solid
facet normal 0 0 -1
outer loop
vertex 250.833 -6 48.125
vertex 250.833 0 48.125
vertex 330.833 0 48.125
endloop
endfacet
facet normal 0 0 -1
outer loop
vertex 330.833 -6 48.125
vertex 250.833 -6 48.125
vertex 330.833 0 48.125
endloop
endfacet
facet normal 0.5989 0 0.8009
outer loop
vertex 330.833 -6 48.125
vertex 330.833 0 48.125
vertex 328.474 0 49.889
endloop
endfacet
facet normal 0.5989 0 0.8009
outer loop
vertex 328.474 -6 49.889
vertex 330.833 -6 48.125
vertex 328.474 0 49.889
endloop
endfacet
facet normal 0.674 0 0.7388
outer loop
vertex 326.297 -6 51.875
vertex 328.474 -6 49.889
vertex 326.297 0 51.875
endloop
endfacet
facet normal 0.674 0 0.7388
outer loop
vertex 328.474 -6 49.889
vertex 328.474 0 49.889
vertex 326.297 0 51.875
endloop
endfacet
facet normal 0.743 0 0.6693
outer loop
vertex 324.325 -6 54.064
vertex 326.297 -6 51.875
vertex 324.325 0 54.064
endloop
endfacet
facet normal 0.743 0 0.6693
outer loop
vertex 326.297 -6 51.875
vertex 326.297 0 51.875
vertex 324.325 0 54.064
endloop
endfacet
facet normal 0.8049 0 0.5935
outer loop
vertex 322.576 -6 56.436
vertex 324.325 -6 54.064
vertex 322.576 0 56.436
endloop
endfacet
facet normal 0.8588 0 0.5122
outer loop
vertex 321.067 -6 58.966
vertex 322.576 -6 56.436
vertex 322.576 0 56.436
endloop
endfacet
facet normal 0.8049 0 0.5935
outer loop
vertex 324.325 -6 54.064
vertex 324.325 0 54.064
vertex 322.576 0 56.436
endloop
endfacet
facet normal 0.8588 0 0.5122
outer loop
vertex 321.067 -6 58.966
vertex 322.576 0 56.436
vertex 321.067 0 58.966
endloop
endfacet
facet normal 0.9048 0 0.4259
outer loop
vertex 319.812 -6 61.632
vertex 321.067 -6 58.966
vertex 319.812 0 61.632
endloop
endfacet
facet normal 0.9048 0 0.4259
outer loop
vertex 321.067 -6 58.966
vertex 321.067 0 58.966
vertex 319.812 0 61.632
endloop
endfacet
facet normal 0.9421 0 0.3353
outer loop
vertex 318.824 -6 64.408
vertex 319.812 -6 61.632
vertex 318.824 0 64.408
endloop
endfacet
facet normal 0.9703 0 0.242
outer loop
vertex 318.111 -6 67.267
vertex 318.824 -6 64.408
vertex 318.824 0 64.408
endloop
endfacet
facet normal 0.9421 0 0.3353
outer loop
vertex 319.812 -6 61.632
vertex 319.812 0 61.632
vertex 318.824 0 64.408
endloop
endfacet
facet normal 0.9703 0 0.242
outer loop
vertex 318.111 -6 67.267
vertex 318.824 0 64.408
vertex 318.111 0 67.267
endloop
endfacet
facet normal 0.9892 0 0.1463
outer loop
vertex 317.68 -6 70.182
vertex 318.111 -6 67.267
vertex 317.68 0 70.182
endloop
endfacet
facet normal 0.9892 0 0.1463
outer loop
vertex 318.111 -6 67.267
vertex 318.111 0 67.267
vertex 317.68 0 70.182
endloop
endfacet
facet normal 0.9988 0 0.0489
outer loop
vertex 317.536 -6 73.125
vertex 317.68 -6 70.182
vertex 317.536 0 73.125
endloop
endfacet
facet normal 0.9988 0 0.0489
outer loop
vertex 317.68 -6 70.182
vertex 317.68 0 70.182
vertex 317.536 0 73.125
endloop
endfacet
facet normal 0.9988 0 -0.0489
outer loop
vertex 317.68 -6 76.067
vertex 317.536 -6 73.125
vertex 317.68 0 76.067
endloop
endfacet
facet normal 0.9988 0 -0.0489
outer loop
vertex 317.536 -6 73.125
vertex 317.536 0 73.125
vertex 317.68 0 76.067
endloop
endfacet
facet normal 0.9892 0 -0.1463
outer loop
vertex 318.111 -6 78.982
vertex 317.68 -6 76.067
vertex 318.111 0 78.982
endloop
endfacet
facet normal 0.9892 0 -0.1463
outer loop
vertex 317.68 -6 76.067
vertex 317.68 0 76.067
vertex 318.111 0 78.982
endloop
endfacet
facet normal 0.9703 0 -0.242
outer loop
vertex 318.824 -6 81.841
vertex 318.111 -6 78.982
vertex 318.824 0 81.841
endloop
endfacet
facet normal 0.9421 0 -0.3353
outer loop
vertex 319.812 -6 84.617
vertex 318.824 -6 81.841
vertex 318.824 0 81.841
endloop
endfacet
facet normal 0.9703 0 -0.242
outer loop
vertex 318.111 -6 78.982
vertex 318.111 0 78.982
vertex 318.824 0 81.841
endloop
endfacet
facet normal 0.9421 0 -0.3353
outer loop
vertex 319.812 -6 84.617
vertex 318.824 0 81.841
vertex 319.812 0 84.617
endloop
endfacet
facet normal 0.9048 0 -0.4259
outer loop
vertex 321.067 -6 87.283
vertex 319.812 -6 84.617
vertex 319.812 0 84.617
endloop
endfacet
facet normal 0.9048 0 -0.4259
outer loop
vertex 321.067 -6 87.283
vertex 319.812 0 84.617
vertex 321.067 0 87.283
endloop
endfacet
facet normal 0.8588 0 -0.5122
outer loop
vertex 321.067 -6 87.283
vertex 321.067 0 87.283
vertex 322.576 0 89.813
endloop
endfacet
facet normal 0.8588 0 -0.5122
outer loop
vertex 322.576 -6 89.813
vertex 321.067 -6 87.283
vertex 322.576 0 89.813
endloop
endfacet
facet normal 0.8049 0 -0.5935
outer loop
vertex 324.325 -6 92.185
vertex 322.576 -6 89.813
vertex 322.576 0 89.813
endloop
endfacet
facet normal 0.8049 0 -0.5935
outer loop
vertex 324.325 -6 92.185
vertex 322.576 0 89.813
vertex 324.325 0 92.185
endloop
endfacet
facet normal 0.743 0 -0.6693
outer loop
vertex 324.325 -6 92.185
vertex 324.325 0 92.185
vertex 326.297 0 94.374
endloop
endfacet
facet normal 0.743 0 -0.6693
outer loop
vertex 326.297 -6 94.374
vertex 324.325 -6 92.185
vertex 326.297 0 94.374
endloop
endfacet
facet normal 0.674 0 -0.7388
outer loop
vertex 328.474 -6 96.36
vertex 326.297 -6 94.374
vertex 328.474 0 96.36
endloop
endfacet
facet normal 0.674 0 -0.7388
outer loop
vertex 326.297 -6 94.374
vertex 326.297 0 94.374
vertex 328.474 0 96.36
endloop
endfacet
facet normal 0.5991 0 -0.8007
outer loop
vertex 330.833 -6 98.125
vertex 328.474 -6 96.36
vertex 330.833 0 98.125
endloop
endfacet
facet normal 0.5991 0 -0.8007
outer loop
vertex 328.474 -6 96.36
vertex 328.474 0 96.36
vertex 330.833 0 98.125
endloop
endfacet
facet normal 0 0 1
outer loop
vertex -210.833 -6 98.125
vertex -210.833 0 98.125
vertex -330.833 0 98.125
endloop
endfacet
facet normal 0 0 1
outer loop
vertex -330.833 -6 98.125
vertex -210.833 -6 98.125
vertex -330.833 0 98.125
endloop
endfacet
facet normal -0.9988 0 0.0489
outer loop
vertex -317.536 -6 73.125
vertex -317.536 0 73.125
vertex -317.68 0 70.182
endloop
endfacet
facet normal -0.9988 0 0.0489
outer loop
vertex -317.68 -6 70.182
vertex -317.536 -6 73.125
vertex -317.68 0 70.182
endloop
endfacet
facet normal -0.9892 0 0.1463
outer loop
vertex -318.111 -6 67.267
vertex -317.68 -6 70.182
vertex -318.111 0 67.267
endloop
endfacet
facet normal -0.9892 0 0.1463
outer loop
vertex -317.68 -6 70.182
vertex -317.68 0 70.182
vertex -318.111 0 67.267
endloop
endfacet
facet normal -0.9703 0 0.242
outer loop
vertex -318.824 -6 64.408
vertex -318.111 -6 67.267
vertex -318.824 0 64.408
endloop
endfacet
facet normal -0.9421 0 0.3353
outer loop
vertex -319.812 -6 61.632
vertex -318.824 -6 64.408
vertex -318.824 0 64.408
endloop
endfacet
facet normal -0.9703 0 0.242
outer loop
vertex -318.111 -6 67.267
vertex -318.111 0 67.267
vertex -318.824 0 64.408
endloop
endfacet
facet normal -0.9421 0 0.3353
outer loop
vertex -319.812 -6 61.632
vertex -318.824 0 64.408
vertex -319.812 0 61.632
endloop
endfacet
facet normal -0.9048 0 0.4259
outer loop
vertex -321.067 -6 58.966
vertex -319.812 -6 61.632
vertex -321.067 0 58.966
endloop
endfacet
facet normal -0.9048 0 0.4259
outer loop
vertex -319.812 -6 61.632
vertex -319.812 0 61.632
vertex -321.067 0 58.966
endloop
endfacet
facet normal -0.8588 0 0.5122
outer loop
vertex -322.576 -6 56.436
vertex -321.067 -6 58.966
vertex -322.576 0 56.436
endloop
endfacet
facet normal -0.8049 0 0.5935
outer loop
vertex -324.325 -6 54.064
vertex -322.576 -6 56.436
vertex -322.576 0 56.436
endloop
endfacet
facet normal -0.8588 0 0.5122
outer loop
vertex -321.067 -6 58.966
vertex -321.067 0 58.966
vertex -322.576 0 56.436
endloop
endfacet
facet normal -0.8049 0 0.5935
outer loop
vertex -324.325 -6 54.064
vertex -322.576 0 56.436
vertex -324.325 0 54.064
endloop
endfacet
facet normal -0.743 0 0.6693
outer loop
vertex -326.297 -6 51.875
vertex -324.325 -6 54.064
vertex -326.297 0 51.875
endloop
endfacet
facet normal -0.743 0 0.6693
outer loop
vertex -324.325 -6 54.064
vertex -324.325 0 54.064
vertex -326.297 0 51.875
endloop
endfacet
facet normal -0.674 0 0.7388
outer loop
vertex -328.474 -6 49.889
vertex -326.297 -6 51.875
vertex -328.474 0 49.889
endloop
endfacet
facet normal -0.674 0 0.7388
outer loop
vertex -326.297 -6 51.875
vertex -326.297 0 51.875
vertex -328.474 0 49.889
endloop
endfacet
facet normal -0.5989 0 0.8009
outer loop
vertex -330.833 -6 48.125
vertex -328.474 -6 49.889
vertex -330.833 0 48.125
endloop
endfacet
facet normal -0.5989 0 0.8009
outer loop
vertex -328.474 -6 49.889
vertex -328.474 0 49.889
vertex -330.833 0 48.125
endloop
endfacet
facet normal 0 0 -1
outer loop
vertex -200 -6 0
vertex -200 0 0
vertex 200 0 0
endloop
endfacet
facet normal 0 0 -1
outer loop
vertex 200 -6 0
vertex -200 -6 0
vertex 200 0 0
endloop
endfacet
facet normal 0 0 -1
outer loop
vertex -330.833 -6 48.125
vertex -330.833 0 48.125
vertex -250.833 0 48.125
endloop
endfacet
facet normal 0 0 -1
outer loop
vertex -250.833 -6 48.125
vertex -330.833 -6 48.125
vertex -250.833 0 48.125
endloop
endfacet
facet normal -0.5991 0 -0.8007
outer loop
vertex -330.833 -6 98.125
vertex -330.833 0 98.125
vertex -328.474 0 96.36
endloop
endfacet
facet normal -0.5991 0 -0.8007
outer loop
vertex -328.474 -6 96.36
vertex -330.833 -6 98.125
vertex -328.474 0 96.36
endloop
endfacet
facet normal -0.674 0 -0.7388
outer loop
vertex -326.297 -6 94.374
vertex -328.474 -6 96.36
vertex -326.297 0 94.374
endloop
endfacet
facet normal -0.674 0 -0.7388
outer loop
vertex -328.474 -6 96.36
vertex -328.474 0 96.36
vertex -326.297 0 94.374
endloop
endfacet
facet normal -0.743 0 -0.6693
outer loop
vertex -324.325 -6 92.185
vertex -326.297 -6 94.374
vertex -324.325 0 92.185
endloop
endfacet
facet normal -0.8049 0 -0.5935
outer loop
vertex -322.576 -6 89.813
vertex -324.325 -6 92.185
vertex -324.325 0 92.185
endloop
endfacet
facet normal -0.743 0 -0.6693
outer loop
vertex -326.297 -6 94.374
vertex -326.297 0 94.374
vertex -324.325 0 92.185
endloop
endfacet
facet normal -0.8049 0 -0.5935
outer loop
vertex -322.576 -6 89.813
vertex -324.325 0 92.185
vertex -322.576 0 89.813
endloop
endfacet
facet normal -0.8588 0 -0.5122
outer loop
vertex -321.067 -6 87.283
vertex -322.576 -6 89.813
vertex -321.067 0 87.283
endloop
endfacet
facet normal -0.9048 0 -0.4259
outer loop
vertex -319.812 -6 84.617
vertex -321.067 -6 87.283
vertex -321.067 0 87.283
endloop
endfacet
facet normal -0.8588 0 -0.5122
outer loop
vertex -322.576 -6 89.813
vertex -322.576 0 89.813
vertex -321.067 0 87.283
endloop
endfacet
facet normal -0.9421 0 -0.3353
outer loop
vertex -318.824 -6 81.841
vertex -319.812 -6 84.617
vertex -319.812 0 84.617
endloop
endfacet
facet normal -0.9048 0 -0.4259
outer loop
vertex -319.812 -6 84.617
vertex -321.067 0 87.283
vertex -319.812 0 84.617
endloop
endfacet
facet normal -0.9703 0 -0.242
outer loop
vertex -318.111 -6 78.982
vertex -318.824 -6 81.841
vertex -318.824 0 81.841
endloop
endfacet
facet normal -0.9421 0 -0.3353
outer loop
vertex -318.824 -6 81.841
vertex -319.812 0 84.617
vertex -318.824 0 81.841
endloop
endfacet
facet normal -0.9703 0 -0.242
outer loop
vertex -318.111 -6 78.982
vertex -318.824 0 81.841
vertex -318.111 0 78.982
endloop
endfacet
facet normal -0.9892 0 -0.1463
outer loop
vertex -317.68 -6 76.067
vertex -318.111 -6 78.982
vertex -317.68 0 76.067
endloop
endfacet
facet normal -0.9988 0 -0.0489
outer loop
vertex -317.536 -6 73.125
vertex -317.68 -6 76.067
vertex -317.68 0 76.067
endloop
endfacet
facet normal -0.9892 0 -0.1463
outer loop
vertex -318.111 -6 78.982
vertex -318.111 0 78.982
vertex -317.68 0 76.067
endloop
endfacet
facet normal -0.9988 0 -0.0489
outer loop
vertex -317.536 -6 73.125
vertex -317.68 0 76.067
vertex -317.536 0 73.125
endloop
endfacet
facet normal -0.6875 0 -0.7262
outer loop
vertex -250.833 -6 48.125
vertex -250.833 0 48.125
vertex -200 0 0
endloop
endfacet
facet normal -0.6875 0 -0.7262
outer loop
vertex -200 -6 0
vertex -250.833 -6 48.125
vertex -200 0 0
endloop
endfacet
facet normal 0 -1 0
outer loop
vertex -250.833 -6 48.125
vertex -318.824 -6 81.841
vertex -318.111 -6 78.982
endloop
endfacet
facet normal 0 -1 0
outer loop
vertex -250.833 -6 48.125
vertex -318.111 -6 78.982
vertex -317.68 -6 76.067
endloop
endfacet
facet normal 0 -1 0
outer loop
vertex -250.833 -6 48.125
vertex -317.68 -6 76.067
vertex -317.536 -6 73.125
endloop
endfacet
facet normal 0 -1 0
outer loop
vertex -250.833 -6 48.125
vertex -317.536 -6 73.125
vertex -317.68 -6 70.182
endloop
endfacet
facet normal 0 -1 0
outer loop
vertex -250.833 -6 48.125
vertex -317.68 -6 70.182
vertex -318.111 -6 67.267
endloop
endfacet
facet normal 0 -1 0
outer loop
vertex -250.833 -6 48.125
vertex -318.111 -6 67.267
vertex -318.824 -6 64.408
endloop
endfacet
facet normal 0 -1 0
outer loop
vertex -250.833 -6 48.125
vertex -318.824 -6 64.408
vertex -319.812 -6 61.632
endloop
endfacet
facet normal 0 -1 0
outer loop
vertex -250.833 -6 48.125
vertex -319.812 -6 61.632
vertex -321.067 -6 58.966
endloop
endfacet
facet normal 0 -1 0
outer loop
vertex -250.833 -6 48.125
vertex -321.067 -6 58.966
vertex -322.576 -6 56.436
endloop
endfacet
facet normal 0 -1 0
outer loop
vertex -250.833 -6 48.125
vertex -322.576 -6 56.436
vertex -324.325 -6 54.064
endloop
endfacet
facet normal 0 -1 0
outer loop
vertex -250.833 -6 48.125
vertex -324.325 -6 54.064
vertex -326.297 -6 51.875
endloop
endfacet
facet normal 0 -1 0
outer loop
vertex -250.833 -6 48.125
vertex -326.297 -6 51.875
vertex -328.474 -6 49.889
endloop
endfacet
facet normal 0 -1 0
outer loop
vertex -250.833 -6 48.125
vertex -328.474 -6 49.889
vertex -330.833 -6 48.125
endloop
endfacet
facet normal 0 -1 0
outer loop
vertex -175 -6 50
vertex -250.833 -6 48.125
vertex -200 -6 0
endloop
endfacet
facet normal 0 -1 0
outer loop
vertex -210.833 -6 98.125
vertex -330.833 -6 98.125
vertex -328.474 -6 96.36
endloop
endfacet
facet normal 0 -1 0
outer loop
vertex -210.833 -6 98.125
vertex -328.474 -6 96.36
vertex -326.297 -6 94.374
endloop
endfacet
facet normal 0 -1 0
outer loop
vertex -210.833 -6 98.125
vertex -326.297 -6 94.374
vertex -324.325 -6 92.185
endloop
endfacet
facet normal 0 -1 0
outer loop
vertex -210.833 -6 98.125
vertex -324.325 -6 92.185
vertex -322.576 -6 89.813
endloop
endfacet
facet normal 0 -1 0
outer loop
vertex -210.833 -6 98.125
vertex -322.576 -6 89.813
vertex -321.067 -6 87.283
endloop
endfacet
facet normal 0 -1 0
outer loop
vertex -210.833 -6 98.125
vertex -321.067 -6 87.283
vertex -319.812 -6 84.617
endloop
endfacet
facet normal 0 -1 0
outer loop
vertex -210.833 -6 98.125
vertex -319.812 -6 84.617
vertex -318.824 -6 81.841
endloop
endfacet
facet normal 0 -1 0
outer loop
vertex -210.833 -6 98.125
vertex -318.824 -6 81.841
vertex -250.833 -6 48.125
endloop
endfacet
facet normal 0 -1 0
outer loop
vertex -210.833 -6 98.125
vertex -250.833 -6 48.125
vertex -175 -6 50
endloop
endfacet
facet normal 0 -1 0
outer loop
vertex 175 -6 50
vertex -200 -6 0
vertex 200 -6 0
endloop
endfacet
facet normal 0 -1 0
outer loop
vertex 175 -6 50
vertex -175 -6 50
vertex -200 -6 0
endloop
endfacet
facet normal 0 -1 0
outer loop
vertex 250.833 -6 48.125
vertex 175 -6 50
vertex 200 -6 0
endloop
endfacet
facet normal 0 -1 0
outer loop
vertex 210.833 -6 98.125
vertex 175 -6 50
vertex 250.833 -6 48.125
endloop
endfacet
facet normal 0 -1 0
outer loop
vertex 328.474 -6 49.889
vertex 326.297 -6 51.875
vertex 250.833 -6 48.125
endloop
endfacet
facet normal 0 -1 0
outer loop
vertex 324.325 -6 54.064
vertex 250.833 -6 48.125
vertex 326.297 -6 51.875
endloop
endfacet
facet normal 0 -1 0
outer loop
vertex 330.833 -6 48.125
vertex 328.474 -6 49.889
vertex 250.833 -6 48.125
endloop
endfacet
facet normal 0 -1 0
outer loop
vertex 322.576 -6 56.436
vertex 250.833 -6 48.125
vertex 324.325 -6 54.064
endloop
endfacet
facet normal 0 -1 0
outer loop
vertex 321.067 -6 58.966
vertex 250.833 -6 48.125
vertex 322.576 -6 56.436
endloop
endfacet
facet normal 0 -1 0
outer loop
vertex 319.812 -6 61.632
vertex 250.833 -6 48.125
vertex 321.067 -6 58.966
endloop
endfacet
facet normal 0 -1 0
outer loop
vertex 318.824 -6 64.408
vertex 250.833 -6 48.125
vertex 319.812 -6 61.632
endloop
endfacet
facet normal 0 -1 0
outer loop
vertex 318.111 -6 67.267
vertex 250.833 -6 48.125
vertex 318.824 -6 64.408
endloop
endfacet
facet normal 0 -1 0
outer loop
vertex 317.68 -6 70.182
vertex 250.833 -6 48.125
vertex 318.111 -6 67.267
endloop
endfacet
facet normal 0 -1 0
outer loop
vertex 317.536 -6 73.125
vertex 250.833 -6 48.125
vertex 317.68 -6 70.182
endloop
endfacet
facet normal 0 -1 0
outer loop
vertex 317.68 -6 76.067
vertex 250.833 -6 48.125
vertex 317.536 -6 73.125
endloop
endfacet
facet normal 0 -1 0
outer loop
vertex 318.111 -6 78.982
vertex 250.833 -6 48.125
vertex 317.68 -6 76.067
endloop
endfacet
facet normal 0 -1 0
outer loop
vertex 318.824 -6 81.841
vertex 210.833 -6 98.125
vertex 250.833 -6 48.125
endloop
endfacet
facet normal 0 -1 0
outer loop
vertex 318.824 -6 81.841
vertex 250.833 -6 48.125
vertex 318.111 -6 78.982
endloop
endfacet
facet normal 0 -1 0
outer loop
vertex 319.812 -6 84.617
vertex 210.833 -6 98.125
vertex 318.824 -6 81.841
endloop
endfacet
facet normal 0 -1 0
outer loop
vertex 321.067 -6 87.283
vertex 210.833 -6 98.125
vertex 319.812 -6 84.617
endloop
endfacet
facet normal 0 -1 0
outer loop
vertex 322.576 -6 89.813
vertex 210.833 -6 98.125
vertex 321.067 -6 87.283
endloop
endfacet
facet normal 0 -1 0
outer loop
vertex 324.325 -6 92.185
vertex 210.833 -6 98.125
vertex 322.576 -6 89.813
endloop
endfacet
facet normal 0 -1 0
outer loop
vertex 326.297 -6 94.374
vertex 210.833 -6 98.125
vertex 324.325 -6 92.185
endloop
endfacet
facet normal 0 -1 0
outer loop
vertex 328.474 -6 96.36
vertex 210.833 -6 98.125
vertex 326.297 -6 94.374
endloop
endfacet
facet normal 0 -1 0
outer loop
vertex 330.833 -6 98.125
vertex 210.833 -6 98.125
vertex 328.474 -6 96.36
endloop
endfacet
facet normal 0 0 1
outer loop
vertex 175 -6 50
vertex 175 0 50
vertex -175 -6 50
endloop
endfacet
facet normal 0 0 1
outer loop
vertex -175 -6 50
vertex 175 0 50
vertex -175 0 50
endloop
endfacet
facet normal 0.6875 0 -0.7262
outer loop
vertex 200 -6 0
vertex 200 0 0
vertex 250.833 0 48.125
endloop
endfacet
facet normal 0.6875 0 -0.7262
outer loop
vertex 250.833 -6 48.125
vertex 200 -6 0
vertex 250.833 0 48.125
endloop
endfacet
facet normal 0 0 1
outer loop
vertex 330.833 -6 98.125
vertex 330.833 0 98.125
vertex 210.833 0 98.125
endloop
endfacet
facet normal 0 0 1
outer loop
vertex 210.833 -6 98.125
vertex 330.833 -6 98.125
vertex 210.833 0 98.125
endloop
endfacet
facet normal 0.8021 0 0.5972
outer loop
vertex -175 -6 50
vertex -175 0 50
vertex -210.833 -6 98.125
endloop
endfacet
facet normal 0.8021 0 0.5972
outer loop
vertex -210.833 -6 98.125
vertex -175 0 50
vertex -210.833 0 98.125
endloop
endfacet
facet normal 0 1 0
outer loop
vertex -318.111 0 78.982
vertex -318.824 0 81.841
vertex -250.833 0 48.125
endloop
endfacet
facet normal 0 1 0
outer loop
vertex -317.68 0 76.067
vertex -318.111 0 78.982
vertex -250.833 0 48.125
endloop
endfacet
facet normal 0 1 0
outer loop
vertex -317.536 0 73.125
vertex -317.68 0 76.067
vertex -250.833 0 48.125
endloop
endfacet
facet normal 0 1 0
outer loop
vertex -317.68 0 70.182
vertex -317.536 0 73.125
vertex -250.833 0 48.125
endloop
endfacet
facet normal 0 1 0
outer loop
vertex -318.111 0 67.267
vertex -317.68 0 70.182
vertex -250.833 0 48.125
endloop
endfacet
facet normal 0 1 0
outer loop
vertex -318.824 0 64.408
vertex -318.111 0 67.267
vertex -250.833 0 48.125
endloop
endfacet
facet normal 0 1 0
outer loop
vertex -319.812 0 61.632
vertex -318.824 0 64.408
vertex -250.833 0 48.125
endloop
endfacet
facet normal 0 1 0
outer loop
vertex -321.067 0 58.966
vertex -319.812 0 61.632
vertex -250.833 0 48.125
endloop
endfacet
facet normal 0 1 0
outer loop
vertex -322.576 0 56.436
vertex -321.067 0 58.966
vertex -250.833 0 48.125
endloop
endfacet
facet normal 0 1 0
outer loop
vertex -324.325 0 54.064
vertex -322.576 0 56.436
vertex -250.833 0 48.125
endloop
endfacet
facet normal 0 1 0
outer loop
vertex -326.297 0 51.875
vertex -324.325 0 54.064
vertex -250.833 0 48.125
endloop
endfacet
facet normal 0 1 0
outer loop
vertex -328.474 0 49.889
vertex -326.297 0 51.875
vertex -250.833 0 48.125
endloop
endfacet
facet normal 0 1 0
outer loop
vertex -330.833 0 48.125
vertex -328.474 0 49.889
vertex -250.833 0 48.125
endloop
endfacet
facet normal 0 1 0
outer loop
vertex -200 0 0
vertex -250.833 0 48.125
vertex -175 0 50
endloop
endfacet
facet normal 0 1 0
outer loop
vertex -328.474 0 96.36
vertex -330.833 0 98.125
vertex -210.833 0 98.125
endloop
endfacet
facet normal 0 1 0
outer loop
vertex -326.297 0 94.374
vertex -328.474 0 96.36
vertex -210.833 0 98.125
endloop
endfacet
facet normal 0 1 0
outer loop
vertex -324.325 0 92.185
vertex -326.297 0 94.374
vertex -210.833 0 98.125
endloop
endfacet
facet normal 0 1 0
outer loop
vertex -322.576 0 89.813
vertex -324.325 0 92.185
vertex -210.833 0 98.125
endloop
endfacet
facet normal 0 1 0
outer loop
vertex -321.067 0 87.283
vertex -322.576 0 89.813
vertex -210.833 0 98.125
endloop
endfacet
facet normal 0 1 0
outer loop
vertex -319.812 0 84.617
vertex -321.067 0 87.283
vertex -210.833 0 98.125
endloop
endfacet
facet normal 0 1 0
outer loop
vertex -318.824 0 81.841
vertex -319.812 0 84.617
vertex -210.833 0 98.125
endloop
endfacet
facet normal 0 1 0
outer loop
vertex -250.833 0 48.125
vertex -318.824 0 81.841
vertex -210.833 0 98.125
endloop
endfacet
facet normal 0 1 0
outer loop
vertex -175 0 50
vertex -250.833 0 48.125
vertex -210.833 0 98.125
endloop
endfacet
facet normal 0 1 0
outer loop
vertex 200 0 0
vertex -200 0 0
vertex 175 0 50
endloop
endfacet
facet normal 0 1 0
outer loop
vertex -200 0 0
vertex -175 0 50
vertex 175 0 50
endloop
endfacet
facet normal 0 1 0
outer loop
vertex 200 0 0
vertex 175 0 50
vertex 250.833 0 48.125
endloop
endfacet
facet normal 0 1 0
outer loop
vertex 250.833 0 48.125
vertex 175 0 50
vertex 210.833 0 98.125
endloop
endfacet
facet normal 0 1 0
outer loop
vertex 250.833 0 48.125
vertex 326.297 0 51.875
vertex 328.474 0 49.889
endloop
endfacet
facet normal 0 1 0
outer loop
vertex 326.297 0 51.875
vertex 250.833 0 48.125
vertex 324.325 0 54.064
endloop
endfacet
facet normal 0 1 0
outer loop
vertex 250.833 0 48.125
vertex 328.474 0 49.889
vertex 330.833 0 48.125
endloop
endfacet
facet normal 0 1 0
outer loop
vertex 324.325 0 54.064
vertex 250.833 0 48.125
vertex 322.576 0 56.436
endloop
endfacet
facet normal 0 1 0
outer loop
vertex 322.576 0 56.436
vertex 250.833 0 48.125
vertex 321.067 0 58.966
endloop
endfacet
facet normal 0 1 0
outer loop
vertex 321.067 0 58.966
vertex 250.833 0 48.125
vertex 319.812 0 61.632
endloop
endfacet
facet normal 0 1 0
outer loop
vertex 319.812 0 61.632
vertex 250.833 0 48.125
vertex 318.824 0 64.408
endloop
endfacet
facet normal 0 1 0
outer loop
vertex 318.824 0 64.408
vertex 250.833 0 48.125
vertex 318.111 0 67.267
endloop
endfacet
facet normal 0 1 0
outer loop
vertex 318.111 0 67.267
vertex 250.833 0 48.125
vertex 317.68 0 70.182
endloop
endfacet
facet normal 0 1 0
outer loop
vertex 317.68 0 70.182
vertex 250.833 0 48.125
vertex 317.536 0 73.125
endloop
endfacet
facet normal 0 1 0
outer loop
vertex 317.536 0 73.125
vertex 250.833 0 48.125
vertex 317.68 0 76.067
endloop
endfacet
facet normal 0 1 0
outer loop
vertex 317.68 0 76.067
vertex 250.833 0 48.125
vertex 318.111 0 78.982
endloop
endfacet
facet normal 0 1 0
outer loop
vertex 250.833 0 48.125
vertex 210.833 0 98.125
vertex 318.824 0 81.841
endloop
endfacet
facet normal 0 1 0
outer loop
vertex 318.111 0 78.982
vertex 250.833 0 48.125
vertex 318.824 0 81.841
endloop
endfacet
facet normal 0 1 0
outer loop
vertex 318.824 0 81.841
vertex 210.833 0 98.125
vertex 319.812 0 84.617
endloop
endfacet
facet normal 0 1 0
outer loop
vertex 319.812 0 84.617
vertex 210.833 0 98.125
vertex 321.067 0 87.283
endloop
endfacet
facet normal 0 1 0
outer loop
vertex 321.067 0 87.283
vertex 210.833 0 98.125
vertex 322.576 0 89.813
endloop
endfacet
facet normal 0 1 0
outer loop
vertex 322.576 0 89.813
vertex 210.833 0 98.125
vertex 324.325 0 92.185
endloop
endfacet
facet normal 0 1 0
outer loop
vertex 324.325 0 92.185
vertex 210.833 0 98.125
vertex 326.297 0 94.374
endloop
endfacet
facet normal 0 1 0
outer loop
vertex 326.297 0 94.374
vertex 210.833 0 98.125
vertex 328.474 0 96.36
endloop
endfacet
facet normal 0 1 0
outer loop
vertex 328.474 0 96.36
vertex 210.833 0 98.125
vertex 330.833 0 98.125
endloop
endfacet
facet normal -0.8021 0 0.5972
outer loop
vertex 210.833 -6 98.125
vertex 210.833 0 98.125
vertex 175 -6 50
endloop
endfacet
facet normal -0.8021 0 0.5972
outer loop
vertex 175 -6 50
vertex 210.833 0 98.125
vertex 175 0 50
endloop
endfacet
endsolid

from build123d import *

# Parameters (mm, degrees)
F1_DEPTH = 6


with BuildPart() as f1:
    # F0 (on Front) → F1 (new body)
    with BuildSketch(Plane.XZ):
        with BuildLine():
            Line((-250.833333, 48.124549), (-200, 0))
            Line((-200, 0), (200, 0))
            Line((200, 0), (250.833333, 48.124549))
            Line((250.833333, 48.124549), (330.833333, 48.124549))
            ThreePointArc((330.833333, 48.124549), (317.5363, 73.124549), (330.833333, 98.124549))
            Line((330.833333, 98.124549), (210.833333, 98.124549))
            Line((210.833333, 98.124549), (175, 50))
            Line((175, 50), (-175, 50))
            Line((-175, 50), (-210.833333, 98.124549))
            Line((-210.833333, 98.124549), (-330.833333, 98.124549))
            ThreePointArc((-330.833333, 98.124549), (-321.067327, 87.282684), (-317.5363, 73.124549))
            ThreePointArc((-317.5363, 73.124549), (-321.067327, 58.966415), (-330.833333, 48.124549))
            Line((-330.833333, 48.124549), (-250.833333, 48.124549))
        make_face()
    extrude(amount=F1_DEPTH)


solid = f1.part
